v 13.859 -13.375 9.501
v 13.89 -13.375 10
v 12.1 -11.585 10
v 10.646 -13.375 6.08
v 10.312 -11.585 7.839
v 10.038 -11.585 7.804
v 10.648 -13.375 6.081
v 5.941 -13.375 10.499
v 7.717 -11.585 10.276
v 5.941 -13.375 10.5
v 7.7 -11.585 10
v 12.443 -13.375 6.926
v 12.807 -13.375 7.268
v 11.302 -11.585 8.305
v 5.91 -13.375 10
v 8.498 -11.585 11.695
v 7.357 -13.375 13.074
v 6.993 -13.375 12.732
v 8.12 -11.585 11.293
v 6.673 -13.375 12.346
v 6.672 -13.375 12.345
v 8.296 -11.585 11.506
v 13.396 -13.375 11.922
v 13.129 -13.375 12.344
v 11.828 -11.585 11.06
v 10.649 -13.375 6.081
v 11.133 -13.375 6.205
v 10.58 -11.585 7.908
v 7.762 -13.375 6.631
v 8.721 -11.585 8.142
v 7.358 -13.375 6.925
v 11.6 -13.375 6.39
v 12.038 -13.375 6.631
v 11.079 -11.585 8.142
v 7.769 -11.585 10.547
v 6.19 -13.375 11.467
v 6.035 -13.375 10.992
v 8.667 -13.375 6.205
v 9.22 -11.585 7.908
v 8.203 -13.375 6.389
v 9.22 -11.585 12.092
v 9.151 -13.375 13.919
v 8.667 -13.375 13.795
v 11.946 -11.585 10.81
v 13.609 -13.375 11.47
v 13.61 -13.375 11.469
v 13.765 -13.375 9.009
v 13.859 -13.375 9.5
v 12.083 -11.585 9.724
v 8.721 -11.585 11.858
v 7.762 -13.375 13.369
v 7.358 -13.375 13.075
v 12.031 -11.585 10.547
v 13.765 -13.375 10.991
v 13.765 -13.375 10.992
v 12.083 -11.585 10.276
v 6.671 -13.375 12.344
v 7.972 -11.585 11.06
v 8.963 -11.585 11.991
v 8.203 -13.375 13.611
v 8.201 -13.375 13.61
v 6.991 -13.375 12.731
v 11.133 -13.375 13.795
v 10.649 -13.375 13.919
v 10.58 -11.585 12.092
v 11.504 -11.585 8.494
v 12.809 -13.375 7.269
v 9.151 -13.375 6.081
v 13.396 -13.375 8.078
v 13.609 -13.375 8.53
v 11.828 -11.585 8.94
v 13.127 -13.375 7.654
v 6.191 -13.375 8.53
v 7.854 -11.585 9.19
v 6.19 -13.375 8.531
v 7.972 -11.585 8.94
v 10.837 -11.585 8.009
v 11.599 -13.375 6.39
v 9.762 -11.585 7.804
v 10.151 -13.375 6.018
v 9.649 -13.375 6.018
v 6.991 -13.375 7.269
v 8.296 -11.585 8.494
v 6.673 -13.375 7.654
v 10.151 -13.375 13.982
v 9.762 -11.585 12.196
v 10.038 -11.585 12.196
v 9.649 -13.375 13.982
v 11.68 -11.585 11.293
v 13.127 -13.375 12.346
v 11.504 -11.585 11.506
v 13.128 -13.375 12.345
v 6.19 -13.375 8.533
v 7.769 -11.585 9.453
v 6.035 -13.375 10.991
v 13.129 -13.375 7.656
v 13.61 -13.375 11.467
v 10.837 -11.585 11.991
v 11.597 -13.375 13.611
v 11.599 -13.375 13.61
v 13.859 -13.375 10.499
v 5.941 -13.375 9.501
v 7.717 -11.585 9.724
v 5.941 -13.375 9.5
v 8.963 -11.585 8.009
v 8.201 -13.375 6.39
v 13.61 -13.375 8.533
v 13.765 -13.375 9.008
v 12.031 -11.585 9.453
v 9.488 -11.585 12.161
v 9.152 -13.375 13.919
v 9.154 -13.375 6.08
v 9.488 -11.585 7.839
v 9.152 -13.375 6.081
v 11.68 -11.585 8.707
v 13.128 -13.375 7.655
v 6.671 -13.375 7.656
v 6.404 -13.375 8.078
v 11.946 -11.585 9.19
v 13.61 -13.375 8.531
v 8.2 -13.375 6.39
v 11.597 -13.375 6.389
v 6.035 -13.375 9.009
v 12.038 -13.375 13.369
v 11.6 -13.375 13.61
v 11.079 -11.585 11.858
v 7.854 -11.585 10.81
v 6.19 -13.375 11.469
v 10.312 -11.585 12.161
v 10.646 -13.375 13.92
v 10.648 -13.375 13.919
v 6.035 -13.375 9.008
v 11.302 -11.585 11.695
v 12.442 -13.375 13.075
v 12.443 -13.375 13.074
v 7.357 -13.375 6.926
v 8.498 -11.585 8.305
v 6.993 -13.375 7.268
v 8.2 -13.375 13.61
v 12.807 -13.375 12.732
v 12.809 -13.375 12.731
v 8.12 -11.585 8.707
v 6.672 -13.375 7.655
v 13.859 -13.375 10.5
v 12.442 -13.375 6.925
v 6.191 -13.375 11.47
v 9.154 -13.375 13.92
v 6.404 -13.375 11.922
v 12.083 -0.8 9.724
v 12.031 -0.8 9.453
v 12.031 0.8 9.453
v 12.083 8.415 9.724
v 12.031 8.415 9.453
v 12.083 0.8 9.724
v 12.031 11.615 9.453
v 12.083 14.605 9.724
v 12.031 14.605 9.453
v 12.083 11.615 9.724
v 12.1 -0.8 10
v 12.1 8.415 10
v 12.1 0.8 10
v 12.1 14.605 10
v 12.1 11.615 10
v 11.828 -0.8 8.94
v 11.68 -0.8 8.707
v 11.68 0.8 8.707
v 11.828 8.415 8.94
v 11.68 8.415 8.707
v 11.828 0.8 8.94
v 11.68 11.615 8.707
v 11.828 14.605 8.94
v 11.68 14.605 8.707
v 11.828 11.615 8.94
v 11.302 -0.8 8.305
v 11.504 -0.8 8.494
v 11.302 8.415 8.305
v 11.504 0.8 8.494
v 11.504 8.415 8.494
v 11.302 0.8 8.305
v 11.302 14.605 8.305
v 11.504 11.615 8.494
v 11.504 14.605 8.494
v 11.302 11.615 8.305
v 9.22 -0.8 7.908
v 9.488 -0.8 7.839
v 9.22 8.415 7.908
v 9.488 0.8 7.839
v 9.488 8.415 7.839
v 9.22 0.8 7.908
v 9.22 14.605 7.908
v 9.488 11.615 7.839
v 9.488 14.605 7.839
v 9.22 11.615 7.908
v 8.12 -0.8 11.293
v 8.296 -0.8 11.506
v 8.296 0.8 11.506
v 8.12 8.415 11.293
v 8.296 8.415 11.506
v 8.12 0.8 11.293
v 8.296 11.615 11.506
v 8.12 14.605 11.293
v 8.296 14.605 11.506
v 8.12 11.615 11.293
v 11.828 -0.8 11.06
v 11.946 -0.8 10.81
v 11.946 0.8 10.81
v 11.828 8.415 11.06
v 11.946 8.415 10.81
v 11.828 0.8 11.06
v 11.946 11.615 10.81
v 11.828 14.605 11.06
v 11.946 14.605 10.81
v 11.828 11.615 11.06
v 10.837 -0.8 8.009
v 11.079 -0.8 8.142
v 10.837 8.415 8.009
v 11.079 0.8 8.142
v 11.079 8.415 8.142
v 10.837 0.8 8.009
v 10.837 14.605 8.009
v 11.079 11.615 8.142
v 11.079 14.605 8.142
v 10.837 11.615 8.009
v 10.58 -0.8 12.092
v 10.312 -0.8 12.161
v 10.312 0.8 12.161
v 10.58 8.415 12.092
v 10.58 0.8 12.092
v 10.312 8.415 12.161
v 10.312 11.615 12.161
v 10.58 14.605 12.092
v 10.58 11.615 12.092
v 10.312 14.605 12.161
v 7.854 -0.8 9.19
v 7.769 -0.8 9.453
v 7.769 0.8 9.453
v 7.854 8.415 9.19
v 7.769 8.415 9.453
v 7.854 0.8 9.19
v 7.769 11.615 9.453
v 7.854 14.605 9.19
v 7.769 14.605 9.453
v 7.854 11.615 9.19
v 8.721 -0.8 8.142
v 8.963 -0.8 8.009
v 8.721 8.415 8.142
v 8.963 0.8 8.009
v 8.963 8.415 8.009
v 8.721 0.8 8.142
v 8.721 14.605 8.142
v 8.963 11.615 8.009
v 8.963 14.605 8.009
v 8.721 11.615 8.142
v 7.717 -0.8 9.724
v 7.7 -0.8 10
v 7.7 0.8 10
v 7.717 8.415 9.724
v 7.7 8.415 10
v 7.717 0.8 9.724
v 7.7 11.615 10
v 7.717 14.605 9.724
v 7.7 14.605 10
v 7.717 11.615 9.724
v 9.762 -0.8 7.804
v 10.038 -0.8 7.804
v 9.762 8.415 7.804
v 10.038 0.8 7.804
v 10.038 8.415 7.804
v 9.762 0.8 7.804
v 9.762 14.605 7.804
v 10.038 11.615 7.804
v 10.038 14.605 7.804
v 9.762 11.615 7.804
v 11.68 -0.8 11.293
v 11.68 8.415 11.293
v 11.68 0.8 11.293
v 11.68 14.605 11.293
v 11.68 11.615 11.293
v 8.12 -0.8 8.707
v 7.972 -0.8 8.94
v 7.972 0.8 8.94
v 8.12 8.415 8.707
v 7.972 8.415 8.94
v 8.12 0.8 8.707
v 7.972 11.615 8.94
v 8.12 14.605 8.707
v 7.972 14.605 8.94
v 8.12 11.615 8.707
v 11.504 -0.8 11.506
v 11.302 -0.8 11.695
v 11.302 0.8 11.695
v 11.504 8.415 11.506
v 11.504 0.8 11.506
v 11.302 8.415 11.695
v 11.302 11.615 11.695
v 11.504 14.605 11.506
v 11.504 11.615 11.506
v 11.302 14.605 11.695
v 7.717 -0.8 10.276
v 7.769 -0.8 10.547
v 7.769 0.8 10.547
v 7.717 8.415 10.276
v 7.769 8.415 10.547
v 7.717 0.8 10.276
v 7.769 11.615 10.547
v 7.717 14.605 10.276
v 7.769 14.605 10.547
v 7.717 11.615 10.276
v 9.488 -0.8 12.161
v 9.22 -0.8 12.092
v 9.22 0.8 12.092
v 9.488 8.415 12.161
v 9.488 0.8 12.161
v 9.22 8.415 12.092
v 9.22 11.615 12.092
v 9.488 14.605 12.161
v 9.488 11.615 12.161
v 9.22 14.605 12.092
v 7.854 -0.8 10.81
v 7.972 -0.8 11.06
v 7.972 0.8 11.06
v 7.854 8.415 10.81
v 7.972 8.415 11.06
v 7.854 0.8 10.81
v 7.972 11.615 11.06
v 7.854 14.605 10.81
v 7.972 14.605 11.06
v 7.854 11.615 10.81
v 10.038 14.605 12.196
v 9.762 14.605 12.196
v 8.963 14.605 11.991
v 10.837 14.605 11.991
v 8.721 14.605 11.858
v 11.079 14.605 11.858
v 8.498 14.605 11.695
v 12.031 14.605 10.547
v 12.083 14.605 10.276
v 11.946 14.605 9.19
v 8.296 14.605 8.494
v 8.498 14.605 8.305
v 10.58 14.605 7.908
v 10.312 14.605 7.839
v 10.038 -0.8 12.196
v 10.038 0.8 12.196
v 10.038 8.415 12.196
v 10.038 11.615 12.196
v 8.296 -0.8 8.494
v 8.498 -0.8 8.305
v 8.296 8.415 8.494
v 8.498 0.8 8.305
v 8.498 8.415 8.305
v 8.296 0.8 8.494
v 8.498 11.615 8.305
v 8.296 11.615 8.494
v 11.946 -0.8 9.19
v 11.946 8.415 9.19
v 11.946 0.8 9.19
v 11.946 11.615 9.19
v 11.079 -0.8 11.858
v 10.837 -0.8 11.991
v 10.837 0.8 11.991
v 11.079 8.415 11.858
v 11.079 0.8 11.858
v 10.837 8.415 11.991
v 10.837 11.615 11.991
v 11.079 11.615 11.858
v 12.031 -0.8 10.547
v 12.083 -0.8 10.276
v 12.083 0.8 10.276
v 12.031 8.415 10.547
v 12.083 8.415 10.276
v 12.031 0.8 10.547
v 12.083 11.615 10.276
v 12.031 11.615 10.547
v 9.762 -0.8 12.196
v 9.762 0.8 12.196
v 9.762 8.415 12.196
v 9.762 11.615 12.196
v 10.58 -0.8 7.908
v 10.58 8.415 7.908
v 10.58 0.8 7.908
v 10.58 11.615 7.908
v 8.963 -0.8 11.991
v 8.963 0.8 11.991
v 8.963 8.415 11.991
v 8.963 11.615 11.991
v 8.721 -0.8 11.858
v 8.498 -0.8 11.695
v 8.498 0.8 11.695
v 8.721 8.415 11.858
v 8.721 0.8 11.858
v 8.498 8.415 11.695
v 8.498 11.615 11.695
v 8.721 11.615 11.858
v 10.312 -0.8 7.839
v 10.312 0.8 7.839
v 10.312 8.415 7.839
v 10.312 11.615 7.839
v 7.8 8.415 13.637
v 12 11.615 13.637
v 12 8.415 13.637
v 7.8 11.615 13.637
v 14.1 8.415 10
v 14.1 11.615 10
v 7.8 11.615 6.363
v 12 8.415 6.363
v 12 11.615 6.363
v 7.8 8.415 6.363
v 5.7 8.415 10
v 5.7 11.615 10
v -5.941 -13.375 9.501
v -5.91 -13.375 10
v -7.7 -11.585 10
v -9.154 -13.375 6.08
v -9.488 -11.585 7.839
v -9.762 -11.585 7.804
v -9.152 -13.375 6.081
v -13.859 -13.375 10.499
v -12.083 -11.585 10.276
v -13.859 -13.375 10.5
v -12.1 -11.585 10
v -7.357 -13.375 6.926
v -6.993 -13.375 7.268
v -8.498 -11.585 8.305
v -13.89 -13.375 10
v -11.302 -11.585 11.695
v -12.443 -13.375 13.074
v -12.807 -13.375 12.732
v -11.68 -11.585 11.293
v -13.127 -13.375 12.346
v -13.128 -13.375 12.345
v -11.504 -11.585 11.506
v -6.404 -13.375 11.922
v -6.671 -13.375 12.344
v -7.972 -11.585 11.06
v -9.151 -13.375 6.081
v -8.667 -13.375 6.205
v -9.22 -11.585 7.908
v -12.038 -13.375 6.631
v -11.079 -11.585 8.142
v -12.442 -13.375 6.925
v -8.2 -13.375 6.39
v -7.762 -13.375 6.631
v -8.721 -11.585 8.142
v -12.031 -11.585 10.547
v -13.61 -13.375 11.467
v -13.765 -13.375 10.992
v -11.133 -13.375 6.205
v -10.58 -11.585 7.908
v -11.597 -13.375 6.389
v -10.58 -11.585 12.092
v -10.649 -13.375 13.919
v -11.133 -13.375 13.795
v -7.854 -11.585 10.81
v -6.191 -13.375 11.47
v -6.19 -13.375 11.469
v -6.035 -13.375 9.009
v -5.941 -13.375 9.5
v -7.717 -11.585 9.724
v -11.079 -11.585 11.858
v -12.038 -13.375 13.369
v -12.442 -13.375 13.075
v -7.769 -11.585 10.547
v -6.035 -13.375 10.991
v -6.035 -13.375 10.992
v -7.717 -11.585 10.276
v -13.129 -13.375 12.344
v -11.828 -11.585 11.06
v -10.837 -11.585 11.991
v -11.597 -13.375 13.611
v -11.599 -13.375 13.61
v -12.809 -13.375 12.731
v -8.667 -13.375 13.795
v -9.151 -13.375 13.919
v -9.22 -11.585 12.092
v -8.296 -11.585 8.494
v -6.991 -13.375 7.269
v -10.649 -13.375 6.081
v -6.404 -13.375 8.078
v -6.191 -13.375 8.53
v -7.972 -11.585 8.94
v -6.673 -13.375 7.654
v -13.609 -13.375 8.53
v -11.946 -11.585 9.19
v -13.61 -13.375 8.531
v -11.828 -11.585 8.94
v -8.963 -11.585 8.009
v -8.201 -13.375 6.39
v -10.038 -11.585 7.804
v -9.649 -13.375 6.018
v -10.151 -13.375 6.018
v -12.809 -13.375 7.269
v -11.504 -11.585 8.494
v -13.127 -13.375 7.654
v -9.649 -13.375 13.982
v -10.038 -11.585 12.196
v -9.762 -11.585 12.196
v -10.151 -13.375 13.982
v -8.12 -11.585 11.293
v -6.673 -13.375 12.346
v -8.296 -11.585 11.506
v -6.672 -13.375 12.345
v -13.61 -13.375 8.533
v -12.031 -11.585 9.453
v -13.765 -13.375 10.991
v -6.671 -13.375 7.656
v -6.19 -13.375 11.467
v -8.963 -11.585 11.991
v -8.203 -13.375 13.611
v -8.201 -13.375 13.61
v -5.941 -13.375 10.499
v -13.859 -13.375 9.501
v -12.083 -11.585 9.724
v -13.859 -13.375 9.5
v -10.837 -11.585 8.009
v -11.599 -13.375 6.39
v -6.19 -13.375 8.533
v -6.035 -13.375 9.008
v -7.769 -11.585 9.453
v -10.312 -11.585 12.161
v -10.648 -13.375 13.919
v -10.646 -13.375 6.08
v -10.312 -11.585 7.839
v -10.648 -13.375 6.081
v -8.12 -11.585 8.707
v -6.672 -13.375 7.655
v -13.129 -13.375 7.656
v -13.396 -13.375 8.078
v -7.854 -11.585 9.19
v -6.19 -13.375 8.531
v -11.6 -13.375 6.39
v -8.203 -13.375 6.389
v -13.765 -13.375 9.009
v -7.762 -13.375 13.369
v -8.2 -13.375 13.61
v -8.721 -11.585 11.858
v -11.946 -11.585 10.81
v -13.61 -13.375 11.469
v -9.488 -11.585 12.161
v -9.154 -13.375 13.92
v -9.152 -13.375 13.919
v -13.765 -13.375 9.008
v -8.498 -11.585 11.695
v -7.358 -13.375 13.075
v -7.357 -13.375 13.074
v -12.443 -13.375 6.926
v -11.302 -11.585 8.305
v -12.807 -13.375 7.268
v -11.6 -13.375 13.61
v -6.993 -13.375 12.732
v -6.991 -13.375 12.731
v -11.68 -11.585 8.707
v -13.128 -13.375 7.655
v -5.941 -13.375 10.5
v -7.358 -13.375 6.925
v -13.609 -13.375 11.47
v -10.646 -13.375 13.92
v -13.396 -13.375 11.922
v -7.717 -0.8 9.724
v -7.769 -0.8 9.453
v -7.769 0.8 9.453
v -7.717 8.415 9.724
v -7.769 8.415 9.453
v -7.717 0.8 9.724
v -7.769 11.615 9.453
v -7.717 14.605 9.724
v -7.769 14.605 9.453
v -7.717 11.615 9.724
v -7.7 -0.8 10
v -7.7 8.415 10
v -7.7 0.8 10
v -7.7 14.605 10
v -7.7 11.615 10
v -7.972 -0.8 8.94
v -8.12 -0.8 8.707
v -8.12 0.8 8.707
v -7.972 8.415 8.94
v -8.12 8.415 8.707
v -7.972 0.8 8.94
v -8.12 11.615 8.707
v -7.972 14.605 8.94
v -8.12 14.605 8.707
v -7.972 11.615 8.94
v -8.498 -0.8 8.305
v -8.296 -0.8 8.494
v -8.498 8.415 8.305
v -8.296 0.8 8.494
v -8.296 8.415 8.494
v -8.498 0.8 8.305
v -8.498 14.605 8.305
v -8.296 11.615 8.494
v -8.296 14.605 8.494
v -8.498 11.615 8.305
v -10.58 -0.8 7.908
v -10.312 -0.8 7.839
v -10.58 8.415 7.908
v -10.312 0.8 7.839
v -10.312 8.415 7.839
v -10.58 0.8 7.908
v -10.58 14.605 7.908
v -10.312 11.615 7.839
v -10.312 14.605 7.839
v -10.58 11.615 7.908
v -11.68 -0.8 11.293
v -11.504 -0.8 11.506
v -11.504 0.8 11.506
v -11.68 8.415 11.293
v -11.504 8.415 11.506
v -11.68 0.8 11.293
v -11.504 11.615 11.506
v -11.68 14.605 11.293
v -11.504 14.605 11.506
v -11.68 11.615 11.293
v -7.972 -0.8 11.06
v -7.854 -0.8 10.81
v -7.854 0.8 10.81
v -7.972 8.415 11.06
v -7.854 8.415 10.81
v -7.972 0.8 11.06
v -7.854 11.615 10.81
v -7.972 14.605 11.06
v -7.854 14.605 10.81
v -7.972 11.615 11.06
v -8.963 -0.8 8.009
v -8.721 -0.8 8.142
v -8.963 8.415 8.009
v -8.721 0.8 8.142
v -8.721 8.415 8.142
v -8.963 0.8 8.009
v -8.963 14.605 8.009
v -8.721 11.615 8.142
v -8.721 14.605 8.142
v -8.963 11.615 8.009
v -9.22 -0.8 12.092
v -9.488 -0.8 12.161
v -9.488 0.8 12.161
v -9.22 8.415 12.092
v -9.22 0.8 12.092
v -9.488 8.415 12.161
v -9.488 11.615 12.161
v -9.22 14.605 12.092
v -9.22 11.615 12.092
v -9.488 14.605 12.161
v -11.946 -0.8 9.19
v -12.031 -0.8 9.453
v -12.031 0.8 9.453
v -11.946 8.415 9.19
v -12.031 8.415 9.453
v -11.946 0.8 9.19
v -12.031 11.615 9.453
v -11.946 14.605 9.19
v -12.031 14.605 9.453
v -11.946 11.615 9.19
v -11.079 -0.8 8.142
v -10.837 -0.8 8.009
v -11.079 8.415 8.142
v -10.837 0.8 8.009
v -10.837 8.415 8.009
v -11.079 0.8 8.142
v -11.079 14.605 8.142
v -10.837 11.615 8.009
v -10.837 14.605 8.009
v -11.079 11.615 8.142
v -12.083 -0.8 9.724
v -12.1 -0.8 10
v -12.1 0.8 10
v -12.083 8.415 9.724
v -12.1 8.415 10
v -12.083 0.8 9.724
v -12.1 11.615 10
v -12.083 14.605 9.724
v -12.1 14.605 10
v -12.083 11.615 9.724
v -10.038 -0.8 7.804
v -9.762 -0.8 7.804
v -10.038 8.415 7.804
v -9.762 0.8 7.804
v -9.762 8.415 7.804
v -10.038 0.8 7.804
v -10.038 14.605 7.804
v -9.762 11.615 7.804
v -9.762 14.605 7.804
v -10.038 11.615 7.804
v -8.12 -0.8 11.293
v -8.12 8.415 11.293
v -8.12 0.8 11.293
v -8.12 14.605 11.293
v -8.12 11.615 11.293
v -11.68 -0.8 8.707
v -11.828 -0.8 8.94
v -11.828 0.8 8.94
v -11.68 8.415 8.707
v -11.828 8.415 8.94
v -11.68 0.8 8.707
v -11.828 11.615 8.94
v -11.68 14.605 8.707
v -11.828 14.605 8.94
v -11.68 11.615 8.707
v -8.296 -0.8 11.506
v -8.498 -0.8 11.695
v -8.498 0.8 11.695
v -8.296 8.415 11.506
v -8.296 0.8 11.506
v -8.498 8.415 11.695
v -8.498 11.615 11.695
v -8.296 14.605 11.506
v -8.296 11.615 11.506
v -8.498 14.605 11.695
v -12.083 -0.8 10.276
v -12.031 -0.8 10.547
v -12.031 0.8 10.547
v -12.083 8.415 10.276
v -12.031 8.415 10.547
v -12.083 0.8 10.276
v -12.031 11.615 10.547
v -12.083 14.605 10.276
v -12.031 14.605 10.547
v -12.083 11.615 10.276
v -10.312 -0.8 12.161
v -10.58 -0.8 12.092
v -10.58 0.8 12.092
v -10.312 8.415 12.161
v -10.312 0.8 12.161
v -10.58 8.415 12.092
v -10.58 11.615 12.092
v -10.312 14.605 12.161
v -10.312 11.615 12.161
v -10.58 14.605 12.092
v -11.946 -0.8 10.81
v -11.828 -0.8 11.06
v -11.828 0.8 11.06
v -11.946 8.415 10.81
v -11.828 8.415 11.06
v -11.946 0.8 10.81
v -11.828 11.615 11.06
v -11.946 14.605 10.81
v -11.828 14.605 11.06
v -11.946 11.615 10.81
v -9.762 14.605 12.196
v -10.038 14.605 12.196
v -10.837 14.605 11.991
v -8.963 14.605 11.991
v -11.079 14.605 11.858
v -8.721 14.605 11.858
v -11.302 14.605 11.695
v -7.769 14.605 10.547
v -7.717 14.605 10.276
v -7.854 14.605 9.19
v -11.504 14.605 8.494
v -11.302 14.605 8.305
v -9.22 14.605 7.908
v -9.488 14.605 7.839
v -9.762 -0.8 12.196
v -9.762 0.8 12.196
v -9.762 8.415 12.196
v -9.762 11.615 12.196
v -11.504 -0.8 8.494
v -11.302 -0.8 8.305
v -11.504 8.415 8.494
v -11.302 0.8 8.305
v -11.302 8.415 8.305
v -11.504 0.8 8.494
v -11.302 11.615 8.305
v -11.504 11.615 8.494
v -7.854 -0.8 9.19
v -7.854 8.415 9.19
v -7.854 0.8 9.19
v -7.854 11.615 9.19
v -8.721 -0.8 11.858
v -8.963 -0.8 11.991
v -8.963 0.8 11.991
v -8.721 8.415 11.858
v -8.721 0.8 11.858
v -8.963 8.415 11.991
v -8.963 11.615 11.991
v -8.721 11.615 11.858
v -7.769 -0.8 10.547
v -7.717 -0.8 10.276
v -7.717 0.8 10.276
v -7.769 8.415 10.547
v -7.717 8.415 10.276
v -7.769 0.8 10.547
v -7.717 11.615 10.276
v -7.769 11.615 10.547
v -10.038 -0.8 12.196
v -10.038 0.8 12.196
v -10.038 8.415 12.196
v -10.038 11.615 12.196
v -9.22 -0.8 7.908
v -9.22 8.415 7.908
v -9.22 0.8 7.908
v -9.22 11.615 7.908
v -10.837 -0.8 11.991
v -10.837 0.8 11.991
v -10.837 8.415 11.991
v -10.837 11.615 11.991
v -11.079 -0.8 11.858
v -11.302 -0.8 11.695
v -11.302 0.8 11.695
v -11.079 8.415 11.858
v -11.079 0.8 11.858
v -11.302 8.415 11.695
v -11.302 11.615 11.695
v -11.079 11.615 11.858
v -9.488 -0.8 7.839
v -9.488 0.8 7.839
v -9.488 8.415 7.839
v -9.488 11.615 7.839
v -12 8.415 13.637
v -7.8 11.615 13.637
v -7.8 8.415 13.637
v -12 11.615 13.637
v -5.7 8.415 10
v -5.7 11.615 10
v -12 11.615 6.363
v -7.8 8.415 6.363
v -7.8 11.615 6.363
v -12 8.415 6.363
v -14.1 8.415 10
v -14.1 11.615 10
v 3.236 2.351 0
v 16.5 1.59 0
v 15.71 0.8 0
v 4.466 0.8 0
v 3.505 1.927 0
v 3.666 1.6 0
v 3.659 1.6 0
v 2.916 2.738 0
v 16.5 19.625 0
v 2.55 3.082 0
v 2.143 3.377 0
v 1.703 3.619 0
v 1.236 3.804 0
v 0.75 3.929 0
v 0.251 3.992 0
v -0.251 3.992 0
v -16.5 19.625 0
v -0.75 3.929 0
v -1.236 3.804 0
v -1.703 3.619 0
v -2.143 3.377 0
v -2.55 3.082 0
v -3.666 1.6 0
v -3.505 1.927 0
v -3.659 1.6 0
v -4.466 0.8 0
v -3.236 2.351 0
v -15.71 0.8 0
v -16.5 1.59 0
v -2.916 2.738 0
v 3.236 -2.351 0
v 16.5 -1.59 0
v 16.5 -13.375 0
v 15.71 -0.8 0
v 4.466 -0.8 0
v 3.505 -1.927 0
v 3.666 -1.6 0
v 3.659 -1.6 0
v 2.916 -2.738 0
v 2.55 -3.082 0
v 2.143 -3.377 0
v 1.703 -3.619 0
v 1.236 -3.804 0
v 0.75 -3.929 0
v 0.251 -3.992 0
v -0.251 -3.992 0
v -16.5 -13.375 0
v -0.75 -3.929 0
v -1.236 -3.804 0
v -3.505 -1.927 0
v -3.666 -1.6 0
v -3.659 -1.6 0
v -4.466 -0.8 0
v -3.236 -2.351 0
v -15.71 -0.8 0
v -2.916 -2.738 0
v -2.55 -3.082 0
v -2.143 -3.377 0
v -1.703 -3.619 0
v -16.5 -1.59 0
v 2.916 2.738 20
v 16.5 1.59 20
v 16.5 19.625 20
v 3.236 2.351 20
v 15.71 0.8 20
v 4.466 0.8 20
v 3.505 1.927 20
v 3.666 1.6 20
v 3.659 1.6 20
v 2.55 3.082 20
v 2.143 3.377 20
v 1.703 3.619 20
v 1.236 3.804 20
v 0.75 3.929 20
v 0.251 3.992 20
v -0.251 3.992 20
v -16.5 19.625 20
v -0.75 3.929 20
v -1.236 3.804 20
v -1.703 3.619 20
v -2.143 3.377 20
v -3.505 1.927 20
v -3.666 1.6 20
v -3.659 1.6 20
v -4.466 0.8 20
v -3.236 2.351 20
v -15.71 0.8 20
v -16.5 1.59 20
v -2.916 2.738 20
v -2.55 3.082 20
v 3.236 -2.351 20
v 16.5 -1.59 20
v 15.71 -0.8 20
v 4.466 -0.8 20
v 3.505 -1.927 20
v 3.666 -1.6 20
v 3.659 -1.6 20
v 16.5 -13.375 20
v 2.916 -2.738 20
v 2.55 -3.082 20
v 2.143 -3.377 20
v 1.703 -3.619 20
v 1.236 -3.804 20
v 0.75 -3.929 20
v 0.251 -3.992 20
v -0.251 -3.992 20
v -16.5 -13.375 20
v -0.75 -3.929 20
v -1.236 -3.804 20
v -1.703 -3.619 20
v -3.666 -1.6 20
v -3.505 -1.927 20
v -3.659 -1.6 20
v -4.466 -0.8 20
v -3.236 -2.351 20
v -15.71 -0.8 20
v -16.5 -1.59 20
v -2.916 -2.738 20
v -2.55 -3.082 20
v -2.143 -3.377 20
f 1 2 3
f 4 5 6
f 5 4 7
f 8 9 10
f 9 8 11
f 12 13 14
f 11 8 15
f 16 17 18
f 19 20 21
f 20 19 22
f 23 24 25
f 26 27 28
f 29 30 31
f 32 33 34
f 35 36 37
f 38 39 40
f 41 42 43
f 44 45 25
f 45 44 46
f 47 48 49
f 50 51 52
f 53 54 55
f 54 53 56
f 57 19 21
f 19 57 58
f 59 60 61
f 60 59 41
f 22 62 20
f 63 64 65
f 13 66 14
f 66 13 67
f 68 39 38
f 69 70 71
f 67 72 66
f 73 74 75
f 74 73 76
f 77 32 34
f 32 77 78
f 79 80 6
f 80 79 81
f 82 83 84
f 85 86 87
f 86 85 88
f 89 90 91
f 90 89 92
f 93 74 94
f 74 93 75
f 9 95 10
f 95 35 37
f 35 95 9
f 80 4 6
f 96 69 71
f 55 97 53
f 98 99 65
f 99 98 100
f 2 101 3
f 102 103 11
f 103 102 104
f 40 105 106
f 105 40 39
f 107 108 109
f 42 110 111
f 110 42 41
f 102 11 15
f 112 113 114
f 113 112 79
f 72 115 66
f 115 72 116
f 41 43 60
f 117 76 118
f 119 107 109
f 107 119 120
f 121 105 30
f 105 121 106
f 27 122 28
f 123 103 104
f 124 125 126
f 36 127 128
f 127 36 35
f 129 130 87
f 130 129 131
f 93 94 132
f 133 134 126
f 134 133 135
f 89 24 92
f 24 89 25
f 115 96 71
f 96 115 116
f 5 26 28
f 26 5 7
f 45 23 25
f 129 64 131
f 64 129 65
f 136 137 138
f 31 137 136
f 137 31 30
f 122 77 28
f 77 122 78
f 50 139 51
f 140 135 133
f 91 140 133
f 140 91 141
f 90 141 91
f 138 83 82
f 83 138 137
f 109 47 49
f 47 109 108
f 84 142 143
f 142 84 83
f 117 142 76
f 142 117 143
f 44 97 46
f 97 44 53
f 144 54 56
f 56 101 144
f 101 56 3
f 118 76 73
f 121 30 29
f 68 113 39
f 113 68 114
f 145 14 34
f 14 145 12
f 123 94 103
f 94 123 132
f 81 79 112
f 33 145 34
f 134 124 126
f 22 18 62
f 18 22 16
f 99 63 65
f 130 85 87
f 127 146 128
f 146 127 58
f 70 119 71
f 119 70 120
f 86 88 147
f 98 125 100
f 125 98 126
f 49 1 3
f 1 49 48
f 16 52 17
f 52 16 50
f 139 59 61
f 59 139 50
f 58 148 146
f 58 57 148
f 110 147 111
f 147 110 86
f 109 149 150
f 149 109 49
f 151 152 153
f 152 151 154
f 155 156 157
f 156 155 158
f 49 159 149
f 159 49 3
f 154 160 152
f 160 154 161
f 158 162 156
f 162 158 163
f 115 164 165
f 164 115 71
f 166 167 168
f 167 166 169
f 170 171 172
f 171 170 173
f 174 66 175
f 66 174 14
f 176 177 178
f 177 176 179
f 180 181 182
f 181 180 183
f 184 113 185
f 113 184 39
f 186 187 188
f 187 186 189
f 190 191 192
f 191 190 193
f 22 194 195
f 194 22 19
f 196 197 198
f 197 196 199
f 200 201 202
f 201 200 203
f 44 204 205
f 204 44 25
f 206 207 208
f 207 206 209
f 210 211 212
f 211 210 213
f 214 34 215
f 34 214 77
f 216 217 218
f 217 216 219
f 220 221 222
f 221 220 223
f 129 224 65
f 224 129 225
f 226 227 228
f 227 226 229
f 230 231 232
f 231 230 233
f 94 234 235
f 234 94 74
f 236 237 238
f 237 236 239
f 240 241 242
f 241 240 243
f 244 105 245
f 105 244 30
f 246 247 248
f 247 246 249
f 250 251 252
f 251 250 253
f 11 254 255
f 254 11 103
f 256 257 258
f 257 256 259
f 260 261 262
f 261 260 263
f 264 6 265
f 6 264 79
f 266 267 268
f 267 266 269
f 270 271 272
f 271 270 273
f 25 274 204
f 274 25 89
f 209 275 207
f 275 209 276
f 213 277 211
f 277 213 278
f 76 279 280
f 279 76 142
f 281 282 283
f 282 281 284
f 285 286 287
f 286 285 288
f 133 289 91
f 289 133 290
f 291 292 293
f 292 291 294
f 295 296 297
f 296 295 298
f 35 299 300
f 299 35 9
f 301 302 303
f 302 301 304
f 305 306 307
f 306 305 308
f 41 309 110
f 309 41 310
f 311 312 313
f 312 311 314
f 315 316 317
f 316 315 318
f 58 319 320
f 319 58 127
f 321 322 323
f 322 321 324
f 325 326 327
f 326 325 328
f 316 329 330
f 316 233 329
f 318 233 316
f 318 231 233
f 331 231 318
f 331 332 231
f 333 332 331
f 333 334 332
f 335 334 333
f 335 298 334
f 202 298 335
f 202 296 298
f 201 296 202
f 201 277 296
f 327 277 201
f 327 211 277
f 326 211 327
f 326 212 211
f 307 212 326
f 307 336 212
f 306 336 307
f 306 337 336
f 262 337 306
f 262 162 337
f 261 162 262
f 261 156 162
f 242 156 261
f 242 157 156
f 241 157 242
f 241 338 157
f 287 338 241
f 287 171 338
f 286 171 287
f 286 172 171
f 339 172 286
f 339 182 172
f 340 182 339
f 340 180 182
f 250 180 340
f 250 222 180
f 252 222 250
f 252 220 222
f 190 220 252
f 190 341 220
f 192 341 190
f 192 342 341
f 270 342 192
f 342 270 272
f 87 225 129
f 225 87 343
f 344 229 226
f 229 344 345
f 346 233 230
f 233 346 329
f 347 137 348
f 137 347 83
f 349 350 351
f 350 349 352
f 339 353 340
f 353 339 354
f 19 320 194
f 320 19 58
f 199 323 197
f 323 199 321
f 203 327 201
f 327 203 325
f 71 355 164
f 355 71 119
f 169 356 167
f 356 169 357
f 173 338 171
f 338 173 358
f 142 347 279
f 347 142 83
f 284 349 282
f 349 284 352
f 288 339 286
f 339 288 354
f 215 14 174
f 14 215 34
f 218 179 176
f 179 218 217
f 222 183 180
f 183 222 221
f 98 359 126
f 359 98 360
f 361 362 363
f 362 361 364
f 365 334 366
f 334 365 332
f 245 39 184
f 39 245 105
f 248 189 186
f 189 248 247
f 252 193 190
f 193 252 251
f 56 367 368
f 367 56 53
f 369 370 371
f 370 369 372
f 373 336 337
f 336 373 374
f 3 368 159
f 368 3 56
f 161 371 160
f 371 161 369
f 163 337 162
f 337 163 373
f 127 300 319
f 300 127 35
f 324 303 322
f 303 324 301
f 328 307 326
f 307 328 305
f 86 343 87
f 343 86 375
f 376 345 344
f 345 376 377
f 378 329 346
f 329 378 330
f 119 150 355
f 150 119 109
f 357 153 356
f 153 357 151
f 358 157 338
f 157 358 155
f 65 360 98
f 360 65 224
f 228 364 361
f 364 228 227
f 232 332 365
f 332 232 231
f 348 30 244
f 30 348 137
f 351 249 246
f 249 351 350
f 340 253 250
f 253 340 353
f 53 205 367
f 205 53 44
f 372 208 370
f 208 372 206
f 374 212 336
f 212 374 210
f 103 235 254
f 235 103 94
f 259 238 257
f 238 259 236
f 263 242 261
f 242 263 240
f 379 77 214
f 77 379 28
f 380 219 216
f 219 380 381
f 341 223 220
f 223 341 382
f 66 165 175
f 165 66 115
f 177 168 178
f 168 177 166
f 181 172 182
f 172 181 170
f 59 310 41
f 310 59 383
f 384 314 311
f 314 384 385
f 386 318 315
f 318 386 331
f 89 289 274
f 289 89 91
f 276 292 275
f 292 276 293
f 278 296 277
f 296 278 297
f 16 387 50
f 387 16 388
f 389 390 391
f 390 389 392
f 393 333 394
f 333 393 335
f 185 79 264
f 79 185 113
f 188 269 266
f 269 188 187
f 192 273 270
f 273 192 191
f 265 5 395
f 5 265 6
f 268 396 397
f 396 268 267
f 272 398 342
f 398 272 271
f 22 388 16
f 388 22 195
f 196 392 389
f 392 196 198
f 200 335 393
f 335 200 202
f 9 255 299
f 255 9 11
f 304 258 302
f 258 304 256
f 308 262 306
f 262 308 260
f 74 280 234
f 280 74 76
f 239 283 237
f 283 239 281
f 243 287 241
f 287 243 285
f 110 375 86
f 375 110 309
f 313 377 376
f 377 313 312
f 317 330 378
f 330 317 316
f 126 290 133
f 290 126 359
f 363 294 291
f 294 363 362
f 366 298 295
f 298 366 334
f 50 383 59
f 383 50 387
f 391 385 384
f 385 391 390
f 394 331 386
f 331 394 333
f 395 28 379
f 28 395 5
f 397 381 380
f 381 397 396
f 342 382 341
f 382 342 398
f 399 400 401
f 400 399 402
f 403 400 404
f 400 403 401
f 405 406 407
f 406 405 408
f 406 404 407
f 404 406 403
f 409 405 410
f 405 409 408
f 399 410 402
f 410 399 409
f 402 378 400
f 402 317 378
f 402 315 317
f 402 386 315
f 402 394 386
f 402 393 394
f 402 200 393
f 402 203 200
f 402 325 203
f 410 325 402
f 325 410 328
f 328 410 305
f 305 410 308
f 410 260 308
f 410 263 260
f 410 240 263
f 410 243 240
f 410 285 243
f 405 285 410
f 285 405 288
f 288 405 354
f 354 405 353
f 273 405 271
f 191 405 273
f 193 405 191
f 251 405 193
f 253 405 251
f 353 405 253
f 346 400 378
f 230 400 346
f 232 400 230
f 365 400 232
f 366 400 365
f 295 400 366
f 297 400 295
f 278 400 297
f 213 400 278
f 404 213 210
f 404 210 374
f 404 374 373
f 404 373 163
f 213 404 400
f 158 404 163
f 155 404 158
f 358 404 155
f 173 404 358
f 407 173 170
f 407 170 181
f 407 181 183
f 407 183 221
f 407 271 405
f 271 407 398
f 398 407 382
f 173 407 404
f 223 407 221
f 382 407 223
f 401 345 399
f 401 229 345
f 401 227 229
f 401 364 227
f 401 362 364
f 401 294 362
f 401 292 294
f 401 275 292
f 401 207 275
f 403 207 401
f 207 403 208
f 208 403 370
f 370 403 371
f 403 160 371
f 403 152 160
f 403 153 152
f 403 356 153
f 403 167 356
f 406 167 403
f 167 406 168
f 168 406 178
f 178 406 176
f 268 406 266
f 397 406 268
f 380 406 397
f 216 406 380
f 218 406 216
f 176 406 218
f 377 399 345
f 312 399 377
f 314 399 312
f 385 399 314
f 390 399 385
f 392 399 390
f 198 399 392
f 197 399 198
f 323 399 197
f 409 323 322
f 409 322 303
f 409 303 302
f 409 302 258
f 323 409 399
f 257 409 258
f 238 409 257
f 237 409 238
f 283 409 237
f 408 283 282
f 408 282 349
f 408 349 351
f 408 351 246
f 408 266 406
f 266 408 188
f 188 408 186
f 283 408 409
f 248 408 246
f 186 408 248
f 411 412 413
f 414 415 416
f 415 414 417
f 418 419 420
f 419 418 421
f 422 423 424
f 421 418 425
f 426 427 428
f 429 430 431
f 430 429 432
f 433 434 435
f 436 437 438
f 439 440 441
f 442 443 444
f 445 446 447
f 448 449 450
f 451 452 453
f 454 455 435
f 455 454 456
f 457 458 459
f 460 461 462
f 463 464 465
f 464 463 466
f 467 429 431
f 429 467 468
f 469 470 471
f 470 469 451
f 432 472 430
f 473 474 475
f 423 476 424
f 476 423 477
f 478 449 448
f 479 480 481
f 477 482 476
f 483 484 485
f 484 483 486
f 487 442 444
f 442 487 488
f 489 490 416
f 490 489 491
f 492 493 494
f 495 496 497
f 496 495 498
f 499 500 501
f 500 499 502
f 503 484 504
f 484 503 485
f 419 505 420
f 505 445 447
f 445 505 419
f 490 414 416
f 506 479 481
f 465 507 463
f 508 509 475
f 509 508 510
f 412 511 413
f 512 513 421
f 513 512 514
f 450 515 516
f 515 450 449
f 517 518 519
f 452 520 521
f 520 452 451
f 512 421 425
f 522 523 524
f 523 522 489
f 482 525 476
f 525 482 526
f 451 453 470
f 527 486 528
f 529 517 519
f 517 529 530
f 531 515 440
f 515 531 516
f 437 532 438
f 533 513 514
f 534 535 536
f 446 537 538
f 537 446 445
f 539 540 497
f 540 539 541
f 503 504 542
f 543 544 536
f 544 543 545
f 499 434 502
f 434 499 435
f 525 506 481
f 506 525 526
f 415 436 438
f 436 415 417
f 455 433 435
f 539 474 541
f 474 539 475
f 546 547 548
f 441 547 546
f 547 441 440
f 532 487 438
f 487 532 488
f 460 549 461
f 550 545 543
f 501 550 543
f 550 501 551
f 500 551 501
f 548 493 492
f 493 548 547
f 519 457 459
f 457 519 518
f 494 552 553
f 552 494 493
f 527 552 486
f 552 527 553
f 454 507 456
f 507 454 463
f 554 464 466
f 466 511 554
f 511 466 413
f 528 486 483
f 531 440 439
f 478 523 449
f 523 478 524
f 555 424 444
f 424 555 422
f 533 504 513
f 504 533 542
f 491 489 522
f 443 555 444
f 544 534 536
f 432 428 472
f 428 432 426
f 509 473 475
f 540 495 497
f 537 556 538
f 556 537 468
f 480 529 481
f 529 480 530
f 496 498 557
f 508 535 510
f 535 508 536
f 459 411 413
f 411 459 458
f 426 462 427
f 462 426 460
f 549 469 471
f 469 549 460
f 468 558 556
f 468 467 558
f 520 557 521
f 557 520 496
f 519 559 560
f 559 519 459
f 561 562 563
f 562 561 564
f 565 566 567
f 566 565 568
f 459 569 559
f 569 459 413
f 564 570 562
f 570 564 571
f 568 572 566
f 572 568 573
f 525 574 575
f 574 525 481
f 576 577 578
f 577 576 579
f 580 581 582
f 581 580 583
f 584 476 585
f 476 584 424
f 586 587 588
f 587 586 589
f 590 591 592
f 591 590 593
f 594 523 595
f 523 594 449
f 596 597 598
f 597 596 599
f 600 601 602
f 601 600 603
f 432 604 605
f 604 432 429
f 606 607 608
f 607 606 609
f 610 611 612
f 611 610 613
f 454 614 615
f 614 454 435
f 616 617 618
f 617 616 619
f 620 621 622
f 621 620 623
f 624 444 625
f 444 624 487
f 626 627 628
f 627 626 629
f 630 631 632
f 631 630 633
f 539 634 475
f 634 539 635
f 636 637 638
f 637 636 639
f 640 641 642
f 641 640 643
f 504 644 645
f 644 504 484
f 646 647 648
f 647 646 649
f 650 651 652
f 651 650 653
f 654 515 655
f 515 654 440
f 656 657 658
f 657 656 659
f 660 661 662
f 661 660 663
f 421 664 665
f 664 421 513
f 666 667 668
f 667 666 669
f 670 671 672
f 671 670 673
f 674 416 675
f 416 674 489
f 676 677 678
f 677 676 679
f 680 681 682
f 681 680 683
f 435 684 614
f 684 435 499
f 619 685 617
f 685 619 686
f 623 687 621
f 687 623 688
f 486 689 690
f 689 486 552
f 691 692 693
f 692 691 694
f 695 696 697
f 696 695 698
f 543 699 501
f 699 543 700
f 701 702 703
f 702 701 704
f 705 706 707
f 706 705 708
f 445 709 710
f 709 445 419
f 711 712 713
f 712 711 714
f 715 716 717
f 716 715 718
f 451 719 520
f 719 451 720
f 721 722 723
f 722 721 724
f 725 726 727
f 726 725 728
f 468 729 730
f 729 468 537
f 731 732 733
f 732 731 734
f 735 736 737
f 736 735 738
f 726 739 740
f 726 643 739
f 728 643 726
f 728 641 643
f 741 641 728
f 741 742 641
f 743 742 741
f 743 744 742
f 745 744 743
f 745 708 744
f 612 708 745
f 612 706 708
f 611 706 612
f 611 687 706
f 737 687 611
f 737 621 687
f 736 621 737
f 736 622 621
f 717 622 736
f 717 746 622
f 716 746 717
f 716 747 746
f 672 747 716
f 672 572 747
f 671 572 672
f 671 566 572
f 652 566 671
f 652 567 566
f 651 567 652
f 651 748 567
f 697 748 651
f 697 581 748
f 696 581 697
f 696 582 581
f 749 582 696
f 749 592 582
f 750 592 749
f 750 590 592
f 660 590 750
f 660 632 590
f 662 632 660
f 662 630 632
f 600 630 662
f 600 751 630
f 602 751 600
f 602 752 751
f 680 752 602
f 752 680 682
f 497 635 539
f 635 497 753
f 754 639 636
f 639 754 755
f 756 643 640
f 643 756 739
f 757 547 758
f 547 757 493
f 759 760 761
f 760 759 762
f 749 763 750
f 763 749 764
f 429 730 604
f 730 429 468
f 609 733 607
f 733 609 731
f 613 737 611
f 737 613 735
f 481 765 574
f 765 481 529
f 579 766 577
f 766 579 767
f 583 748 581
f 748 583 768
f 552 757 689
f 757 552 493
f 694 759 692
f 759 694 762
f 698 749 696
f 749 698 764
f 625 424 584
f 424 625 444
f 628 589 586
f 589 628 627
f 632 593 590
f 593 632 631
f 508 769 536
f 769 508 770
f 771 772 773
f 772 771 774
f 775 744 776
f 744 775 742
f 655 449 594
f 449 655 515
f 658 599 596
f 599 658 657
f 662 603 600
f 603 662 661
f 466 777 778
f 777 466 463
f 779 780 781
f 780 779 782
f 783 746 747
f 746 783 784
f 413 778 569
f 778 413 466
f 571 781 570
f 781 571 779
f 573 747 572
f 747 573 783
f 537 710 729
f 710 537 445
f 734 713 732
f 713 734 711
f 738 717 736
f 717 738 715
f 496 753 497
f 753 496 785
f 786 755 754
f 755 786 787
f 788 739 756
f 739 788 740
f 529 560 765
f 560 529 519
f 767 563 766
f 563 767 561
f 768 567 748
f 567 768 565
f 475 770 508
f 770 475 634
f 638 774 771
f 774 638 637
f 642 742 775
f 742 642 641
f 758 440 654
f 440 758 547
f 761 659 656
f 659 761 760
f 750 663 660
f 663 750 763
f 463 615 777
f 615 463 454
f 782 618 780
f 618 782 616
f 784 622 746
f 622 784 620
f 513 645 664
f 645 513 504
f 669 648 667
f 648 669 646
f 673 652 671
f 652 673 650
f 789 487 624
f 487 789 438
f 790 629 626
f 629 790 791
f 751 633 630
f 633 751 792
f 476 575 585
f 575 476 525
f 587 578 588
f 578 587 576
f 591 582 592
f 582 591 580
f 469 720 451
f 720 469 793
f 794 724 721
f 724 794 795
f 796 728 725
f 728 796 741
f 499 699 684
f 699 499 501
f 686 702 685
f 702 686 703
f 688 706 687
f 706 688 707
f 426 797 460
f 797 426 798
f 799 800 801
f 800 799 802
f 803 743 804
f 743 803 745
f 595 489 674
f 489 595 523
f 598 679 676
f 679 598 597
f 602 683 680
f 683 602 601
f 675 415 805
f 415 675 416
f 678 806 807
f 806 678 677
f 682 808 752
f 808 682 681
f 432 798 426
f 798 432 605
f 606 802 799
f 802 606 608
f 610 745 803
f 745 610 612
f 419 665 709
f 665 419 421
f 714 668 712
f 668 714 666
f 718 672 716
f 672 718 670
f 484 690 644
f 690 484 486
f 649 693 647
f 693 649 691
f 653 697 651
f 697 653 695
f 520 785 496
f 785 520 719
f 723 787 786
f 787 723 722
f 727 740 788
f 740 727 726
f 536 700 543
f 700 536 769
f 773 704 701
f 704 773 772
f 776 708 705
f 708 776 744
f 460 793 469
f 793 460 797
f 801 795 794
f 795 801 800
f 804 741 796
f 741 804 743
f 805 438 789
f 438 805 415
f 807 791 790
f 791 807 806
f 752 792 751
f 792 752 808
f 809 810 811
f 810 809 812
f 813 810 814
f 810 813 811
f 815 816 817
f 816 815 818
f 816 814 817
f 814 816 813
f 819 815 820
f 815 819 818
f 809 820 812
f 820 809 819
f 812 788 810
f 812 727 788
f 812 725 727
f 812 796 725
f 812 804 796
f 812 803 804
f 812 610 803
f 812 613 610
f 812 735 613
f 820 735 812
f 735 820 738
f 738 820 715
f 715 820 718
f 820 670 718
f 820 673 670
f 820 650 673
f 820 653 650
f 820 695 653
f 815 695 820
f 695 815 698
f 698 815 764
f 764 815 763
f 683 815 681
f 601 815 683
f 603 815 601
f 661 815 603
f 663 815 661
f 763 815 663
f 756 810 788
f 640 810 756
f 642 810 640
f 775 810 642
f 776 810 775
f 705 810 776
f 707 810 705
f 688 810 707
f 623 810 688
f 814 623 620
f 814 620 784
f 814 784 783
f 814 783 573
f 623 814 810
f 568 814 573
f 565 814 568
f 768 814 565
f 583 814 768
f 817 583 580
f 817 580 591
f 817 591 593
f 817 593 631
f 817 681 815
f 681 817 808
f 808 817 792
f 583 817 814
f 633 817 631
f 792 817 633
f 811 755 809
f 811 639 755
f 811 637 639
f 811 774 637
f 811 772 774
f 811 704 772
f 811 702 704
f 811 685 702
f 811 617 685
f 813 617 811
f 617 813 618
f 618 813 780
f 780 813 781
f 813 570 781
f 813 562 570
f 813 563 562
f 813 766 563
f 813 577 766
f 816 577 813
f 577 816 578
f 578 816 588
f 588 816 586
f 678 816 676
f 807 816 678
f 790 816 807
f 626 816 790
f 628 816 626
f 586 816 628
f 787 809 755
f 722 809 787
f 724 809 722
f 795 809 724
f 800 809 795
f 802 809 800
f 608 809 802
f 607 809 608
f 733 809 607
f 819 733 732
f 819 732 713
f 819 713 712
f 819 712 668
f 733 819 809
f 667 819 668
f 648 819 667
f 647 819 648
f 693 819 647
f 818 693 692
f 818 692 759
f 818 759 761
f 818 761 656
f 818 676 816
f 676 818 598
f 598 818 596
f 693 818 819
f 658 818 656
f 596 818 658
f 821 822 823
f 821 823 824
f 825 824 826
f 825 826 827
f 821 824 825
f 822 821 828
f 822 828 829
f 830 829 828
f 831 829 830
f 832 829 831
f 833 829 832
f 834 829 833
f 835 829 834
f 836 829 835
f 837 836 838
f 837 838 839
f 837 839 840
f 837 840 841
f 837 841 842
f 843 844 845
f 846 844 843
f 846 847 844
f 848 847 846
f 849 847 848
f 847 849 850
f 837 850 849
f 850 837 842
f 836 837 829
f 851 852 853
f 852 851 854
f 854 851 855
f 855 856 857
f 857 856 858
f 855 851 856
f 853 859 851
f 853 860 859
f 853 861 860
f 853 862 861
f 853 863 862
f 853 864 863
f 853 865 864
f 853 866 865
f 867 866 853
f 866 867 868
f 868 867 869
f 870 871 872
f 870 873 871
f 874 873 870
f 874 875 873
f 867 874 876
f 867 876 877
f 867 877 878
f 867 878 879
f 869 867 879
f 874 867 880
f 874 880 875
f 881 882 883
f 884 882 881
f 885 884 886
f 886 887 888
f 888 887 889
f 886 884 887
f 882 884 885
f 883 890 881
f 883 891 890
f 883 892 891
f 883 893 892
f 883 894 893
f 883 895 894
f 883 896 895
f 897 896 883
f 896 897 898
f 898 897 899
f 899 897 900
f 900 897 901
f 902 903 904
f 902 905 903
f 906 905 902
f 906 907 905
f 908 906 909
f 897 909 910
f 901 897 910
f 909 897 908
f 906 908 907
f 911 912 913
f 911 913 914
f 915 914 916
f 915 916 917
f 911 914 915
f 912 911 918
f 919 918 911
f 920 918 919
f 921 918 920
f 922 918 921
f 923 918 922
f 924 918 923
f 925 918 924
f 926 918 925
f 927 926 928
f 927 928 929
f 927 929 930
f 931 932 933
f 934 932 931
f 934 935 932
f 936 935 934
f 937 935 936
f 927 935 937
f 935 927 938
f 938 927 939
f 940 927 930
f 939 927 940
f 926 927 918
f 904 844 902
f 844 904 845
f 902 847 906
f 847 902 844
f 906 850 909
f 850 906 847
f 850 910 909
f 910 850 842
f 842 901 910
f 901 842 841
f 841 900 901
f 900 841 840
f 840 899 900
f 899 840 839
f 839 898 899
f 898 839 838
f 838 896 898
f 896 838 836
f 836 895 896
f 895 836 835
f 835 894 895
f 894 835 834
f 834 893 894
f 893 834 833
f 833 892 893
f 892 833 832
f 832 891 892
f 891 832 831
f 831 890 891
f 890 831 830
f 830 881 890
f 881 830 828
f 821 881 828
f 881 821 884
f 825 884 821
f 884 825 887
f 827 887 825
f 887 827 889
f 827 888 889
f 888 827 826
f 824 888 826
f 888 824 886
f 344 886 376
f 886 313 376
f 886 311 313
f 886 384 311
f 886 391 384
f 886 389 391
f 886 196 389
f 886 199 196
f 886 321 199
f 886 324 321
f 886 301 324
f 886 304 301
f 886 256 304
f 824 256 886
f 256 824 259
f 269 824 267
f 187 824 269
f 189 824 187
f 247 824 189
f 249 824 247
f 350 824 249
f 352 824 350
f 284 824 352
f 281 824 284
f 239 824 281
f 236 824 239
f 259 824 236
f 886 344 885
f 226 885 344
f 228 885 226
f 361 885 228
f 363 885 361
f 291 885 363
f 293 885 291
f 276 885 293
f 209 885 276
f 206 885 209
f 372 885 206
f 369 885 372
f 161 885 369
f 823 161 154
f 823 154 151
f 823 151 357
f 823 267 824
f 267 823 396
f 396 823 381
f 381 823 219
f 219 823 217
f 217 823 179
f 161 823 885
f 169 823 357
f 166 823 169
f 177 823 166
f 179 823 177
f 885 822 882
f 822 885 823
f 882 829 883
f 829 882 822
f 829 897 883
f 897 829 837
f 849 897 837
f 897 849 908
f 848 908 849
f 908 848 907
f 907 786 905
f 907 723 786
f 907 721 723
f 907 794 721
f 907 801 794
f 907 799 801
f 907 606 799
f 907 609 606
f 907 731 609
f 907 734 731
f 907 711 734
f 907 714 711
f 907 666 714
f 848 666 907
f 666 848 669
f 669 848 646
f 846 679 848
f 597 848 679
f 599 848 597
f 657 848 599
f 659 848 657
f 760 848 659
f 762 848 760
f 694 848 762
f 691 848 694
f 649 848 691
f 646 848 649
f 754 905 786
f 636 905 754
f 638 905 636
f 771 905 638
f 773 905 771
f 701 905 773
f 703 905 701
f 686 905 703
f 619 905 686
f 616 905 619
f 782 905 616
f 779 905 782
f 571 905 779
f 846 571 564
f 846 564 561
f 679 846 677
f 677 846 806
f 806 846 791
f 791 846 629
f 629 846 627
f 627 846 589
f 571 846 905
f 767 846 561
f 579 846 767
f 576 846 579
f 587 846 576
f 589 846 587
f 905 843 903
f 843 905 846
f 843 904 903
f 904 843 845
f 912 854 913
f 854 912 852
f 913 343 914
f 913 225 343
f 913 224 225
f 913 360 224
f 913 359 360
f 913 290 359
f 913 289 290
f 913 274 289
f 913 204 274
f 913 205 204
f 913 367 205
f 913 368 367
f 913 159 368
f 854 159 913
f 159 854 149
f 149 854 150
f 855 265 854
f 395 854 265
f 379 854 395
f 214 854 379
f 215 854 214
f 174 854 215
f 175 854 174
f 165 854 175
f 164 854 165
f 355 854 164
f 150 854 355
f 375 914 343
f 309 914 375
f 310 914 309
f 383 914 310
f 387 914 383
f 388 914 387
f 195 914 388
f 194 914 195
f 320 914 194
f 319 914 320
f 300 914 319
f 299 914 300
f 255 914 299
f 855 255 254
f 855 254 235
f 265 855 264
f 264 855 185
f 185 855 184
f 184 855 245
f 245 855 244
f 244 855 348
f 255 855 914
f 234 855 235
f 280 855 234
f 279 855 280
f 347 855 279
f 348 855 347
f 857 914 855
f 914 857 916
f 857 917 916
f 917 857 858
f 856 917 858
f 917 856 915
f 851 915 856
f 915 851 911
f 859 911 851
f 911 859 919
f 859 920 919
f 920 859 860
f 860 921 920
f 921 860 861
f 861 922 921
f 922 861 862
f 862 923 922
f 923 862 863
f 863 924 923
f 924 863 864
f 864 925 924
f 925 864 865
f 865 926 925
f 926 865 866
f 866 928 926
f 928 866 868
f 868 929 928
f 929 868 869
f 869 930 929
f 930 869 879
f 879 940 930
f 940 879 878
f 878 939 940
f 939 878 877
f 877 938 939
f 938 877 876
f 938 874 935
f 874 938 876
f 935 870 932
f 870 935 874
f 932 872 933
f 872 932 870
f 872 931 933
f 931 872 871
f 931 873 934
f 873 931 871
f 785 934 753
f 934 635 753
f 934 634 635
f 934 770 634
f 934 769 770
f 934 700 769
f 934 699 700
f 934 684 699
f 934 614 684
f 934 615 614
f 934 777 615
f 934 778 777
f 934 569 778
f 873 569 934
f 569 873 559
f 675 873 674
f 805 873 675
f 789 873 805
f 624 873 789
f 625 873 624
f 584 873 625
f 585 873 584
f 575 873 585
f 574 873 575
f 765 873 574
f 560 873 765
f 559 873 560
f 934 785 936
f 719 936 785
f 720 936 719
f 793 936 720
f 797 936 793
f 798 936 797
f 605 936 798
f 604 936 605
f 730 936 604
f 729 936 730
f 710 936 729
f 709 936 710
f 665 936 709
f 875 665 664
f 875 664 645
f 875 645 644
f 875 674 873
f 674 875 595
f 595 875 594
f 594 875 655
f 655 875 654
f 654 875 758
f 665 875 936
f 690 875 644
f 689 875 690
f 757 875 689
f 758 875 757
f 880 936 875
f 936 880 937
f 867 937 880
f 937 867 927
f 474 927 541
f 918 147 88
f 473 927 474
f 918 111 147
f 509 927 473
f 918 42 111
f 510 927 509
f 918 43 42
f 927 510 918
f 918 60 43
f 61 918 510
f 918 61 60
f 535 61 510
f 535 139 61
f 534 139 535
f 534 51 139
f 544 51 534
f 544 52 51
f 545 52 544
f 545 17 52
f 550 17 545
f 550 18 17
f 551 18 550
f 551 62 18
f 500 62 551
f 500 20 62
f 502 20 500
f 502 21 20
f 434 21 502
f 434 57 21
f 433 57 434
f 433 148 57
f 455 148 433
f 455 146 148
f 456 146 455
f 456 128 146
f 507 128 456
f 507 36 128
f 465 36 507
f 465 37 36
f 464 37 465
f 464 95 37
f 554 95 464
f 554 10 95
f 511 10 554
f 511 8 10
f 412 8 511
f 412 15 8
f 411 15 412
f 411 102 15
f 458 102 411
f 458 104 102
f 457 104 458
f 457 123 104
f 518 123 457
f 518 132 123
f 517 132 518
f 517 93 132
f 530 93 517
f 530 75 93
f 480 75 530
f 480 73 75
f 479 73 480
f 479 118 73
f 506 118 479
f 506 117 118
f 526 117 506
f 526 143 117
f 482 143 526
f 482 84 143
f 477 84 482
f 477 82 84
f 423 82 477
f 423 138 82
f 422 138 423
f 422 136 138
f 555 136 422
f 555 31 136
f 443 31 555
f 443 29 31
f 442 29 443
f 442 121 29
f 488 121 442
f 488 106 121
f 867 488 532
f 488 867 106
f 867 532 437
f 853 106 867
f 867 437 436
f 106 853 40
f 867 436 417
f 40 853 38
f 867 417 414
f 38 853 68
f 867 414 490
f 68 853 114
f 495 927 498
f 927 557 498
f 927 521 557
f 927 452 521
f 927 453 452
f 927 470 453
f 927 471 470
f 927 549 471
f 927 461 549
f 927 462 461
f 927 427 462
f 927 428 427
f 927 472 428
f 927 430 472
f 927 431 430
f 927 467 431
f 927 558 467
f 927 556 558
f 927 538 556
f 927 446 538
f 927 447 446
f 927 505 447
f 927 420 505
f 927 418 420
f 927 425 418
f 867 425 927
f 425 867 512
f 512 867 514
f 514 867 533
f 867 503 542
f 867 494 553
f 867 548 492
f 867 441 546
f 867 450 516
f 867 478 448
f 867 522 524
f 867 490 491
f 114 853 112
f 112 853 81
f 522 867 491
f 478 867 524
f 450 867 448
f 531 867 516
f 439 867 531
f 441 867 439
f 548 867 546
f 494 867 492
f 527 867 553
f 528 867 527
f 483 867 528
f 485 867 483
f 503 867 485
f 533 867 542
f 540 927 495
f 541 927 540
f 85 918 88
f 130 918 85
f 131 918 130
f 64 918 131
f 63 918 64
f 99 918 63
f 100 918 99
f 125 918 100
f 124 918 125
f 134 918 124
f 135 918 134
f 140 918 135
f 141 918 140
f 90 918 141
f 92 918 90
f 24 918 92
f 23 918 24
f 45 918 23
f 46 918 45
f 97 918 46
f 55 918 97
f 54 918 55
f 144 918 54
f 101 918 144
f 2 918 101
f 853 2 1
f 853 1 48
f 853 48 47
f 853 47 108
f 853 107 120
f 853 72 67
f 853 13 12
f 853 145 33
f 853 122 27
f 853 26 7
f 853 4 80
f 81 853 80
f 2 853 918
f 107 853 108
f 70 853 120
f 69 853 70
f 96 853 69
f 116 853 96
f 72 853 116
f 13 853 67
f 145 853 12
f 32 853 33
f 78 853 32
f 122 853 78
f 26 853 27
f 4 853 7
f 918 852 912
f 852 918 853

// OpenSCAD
width = 33;
height = 20;
pendiam = 8;

bdiam = 4;
bheight = 25;

S_excentricity = 0.25;
S_tolerance = 0.01;
S_wallX = 0.5 * (width - S_excentricity * (width - pendiam)) + S_tolerance;
S_btolerance = 0.4;
S_noffset = 3;

module penholder(cwidth, clength, cheight, pdiam, swidth, lwidth, excentricity=0) {
  _tolerance = 0.01;
  linear_extrude(cheight, convexity=4) difference() {
    translate([0, 0.5 * excentricity * (clength - pdiam)]) square([cwidth, clength], center=true);
    circle(d=pdiam, $fn=50);
    square([2*(cwidth+_tolerance), swidth], center=true);
    
    _olipX = cwidth/2 + _tolerance;
    _ilipX = (pdiam/2) * cos(asin((lwidth + swidth/2) / (pdiam/2))) + lwidth;
    _olipY = swidth/2;
    polygon([[-_olipX, _olipY+lwidth], [-_olipX+lwidth, _olipY], [-_olipX+lwidth, -_olipY], [-_olipX, -_olipY-lwidth]]);
    polygon([[_olipX, _olipY+lwidth], [_olipX-lwidth, _olipY], [_olipX-lwidth, -_olipY], [_olipX, -_olipY-lwidth]]);
    polygon([[_ilipX, _olipY], [_ilipX-lwidth, _olipY+lwidth], [-_ilipX+lwidth, _olipY+lwidth], [-_ilipX, _olipY], [-_ilipX, -_olipY], [-_ilipX+lwidth, -_olipY-lwidth], [_ilipX-lwidth, -_olipY-lwidth], [_ilipX, -_olipY]]);
  }
}

module nutandbolt(bdiam, blength, bhead, ndiam, nheight, noffset=0) {
  _tolerance = 0.01;
  _bheadlength = (bhead - bdiam) / 2;
  union() {
    cylinder(_bheadlength, d1=bhead, d2=bdiam, center=false, $fn=50);
    translate([0, 0, _bheadlength-_tolerance]) cylinder(blength - _bheadlength, d=bdiam, $fn=50);
    translate([0, 0, blength - nheight - noffset]) cylinder(nheight, d=ndiam, $fn=6);
  }
}

difference() {
  penholder(width, width, height, pendiam, 0.2*pendiam, 0.1*pendiam, S_excentricity);
  translate([0.3*width, -S_wallX, height/2]) rotate([-90, 0, 0]) nutandbolt(bdiam+S_btolerance, bheight+S_noffset, 2*bdiam, 2*bdiam+S_btolerance, 0.8*bdiam, S_noffset);
  translate([-0.3*width, -S_wallX, height/2]) rotate([-90, 0, 0]) nutandbolt(bdiam+S_btolerance, bheight+S_noffset, 2*bdiam, 2*bdiam+S_btolerance, 0.8*bdiam, S_noffset);
}
